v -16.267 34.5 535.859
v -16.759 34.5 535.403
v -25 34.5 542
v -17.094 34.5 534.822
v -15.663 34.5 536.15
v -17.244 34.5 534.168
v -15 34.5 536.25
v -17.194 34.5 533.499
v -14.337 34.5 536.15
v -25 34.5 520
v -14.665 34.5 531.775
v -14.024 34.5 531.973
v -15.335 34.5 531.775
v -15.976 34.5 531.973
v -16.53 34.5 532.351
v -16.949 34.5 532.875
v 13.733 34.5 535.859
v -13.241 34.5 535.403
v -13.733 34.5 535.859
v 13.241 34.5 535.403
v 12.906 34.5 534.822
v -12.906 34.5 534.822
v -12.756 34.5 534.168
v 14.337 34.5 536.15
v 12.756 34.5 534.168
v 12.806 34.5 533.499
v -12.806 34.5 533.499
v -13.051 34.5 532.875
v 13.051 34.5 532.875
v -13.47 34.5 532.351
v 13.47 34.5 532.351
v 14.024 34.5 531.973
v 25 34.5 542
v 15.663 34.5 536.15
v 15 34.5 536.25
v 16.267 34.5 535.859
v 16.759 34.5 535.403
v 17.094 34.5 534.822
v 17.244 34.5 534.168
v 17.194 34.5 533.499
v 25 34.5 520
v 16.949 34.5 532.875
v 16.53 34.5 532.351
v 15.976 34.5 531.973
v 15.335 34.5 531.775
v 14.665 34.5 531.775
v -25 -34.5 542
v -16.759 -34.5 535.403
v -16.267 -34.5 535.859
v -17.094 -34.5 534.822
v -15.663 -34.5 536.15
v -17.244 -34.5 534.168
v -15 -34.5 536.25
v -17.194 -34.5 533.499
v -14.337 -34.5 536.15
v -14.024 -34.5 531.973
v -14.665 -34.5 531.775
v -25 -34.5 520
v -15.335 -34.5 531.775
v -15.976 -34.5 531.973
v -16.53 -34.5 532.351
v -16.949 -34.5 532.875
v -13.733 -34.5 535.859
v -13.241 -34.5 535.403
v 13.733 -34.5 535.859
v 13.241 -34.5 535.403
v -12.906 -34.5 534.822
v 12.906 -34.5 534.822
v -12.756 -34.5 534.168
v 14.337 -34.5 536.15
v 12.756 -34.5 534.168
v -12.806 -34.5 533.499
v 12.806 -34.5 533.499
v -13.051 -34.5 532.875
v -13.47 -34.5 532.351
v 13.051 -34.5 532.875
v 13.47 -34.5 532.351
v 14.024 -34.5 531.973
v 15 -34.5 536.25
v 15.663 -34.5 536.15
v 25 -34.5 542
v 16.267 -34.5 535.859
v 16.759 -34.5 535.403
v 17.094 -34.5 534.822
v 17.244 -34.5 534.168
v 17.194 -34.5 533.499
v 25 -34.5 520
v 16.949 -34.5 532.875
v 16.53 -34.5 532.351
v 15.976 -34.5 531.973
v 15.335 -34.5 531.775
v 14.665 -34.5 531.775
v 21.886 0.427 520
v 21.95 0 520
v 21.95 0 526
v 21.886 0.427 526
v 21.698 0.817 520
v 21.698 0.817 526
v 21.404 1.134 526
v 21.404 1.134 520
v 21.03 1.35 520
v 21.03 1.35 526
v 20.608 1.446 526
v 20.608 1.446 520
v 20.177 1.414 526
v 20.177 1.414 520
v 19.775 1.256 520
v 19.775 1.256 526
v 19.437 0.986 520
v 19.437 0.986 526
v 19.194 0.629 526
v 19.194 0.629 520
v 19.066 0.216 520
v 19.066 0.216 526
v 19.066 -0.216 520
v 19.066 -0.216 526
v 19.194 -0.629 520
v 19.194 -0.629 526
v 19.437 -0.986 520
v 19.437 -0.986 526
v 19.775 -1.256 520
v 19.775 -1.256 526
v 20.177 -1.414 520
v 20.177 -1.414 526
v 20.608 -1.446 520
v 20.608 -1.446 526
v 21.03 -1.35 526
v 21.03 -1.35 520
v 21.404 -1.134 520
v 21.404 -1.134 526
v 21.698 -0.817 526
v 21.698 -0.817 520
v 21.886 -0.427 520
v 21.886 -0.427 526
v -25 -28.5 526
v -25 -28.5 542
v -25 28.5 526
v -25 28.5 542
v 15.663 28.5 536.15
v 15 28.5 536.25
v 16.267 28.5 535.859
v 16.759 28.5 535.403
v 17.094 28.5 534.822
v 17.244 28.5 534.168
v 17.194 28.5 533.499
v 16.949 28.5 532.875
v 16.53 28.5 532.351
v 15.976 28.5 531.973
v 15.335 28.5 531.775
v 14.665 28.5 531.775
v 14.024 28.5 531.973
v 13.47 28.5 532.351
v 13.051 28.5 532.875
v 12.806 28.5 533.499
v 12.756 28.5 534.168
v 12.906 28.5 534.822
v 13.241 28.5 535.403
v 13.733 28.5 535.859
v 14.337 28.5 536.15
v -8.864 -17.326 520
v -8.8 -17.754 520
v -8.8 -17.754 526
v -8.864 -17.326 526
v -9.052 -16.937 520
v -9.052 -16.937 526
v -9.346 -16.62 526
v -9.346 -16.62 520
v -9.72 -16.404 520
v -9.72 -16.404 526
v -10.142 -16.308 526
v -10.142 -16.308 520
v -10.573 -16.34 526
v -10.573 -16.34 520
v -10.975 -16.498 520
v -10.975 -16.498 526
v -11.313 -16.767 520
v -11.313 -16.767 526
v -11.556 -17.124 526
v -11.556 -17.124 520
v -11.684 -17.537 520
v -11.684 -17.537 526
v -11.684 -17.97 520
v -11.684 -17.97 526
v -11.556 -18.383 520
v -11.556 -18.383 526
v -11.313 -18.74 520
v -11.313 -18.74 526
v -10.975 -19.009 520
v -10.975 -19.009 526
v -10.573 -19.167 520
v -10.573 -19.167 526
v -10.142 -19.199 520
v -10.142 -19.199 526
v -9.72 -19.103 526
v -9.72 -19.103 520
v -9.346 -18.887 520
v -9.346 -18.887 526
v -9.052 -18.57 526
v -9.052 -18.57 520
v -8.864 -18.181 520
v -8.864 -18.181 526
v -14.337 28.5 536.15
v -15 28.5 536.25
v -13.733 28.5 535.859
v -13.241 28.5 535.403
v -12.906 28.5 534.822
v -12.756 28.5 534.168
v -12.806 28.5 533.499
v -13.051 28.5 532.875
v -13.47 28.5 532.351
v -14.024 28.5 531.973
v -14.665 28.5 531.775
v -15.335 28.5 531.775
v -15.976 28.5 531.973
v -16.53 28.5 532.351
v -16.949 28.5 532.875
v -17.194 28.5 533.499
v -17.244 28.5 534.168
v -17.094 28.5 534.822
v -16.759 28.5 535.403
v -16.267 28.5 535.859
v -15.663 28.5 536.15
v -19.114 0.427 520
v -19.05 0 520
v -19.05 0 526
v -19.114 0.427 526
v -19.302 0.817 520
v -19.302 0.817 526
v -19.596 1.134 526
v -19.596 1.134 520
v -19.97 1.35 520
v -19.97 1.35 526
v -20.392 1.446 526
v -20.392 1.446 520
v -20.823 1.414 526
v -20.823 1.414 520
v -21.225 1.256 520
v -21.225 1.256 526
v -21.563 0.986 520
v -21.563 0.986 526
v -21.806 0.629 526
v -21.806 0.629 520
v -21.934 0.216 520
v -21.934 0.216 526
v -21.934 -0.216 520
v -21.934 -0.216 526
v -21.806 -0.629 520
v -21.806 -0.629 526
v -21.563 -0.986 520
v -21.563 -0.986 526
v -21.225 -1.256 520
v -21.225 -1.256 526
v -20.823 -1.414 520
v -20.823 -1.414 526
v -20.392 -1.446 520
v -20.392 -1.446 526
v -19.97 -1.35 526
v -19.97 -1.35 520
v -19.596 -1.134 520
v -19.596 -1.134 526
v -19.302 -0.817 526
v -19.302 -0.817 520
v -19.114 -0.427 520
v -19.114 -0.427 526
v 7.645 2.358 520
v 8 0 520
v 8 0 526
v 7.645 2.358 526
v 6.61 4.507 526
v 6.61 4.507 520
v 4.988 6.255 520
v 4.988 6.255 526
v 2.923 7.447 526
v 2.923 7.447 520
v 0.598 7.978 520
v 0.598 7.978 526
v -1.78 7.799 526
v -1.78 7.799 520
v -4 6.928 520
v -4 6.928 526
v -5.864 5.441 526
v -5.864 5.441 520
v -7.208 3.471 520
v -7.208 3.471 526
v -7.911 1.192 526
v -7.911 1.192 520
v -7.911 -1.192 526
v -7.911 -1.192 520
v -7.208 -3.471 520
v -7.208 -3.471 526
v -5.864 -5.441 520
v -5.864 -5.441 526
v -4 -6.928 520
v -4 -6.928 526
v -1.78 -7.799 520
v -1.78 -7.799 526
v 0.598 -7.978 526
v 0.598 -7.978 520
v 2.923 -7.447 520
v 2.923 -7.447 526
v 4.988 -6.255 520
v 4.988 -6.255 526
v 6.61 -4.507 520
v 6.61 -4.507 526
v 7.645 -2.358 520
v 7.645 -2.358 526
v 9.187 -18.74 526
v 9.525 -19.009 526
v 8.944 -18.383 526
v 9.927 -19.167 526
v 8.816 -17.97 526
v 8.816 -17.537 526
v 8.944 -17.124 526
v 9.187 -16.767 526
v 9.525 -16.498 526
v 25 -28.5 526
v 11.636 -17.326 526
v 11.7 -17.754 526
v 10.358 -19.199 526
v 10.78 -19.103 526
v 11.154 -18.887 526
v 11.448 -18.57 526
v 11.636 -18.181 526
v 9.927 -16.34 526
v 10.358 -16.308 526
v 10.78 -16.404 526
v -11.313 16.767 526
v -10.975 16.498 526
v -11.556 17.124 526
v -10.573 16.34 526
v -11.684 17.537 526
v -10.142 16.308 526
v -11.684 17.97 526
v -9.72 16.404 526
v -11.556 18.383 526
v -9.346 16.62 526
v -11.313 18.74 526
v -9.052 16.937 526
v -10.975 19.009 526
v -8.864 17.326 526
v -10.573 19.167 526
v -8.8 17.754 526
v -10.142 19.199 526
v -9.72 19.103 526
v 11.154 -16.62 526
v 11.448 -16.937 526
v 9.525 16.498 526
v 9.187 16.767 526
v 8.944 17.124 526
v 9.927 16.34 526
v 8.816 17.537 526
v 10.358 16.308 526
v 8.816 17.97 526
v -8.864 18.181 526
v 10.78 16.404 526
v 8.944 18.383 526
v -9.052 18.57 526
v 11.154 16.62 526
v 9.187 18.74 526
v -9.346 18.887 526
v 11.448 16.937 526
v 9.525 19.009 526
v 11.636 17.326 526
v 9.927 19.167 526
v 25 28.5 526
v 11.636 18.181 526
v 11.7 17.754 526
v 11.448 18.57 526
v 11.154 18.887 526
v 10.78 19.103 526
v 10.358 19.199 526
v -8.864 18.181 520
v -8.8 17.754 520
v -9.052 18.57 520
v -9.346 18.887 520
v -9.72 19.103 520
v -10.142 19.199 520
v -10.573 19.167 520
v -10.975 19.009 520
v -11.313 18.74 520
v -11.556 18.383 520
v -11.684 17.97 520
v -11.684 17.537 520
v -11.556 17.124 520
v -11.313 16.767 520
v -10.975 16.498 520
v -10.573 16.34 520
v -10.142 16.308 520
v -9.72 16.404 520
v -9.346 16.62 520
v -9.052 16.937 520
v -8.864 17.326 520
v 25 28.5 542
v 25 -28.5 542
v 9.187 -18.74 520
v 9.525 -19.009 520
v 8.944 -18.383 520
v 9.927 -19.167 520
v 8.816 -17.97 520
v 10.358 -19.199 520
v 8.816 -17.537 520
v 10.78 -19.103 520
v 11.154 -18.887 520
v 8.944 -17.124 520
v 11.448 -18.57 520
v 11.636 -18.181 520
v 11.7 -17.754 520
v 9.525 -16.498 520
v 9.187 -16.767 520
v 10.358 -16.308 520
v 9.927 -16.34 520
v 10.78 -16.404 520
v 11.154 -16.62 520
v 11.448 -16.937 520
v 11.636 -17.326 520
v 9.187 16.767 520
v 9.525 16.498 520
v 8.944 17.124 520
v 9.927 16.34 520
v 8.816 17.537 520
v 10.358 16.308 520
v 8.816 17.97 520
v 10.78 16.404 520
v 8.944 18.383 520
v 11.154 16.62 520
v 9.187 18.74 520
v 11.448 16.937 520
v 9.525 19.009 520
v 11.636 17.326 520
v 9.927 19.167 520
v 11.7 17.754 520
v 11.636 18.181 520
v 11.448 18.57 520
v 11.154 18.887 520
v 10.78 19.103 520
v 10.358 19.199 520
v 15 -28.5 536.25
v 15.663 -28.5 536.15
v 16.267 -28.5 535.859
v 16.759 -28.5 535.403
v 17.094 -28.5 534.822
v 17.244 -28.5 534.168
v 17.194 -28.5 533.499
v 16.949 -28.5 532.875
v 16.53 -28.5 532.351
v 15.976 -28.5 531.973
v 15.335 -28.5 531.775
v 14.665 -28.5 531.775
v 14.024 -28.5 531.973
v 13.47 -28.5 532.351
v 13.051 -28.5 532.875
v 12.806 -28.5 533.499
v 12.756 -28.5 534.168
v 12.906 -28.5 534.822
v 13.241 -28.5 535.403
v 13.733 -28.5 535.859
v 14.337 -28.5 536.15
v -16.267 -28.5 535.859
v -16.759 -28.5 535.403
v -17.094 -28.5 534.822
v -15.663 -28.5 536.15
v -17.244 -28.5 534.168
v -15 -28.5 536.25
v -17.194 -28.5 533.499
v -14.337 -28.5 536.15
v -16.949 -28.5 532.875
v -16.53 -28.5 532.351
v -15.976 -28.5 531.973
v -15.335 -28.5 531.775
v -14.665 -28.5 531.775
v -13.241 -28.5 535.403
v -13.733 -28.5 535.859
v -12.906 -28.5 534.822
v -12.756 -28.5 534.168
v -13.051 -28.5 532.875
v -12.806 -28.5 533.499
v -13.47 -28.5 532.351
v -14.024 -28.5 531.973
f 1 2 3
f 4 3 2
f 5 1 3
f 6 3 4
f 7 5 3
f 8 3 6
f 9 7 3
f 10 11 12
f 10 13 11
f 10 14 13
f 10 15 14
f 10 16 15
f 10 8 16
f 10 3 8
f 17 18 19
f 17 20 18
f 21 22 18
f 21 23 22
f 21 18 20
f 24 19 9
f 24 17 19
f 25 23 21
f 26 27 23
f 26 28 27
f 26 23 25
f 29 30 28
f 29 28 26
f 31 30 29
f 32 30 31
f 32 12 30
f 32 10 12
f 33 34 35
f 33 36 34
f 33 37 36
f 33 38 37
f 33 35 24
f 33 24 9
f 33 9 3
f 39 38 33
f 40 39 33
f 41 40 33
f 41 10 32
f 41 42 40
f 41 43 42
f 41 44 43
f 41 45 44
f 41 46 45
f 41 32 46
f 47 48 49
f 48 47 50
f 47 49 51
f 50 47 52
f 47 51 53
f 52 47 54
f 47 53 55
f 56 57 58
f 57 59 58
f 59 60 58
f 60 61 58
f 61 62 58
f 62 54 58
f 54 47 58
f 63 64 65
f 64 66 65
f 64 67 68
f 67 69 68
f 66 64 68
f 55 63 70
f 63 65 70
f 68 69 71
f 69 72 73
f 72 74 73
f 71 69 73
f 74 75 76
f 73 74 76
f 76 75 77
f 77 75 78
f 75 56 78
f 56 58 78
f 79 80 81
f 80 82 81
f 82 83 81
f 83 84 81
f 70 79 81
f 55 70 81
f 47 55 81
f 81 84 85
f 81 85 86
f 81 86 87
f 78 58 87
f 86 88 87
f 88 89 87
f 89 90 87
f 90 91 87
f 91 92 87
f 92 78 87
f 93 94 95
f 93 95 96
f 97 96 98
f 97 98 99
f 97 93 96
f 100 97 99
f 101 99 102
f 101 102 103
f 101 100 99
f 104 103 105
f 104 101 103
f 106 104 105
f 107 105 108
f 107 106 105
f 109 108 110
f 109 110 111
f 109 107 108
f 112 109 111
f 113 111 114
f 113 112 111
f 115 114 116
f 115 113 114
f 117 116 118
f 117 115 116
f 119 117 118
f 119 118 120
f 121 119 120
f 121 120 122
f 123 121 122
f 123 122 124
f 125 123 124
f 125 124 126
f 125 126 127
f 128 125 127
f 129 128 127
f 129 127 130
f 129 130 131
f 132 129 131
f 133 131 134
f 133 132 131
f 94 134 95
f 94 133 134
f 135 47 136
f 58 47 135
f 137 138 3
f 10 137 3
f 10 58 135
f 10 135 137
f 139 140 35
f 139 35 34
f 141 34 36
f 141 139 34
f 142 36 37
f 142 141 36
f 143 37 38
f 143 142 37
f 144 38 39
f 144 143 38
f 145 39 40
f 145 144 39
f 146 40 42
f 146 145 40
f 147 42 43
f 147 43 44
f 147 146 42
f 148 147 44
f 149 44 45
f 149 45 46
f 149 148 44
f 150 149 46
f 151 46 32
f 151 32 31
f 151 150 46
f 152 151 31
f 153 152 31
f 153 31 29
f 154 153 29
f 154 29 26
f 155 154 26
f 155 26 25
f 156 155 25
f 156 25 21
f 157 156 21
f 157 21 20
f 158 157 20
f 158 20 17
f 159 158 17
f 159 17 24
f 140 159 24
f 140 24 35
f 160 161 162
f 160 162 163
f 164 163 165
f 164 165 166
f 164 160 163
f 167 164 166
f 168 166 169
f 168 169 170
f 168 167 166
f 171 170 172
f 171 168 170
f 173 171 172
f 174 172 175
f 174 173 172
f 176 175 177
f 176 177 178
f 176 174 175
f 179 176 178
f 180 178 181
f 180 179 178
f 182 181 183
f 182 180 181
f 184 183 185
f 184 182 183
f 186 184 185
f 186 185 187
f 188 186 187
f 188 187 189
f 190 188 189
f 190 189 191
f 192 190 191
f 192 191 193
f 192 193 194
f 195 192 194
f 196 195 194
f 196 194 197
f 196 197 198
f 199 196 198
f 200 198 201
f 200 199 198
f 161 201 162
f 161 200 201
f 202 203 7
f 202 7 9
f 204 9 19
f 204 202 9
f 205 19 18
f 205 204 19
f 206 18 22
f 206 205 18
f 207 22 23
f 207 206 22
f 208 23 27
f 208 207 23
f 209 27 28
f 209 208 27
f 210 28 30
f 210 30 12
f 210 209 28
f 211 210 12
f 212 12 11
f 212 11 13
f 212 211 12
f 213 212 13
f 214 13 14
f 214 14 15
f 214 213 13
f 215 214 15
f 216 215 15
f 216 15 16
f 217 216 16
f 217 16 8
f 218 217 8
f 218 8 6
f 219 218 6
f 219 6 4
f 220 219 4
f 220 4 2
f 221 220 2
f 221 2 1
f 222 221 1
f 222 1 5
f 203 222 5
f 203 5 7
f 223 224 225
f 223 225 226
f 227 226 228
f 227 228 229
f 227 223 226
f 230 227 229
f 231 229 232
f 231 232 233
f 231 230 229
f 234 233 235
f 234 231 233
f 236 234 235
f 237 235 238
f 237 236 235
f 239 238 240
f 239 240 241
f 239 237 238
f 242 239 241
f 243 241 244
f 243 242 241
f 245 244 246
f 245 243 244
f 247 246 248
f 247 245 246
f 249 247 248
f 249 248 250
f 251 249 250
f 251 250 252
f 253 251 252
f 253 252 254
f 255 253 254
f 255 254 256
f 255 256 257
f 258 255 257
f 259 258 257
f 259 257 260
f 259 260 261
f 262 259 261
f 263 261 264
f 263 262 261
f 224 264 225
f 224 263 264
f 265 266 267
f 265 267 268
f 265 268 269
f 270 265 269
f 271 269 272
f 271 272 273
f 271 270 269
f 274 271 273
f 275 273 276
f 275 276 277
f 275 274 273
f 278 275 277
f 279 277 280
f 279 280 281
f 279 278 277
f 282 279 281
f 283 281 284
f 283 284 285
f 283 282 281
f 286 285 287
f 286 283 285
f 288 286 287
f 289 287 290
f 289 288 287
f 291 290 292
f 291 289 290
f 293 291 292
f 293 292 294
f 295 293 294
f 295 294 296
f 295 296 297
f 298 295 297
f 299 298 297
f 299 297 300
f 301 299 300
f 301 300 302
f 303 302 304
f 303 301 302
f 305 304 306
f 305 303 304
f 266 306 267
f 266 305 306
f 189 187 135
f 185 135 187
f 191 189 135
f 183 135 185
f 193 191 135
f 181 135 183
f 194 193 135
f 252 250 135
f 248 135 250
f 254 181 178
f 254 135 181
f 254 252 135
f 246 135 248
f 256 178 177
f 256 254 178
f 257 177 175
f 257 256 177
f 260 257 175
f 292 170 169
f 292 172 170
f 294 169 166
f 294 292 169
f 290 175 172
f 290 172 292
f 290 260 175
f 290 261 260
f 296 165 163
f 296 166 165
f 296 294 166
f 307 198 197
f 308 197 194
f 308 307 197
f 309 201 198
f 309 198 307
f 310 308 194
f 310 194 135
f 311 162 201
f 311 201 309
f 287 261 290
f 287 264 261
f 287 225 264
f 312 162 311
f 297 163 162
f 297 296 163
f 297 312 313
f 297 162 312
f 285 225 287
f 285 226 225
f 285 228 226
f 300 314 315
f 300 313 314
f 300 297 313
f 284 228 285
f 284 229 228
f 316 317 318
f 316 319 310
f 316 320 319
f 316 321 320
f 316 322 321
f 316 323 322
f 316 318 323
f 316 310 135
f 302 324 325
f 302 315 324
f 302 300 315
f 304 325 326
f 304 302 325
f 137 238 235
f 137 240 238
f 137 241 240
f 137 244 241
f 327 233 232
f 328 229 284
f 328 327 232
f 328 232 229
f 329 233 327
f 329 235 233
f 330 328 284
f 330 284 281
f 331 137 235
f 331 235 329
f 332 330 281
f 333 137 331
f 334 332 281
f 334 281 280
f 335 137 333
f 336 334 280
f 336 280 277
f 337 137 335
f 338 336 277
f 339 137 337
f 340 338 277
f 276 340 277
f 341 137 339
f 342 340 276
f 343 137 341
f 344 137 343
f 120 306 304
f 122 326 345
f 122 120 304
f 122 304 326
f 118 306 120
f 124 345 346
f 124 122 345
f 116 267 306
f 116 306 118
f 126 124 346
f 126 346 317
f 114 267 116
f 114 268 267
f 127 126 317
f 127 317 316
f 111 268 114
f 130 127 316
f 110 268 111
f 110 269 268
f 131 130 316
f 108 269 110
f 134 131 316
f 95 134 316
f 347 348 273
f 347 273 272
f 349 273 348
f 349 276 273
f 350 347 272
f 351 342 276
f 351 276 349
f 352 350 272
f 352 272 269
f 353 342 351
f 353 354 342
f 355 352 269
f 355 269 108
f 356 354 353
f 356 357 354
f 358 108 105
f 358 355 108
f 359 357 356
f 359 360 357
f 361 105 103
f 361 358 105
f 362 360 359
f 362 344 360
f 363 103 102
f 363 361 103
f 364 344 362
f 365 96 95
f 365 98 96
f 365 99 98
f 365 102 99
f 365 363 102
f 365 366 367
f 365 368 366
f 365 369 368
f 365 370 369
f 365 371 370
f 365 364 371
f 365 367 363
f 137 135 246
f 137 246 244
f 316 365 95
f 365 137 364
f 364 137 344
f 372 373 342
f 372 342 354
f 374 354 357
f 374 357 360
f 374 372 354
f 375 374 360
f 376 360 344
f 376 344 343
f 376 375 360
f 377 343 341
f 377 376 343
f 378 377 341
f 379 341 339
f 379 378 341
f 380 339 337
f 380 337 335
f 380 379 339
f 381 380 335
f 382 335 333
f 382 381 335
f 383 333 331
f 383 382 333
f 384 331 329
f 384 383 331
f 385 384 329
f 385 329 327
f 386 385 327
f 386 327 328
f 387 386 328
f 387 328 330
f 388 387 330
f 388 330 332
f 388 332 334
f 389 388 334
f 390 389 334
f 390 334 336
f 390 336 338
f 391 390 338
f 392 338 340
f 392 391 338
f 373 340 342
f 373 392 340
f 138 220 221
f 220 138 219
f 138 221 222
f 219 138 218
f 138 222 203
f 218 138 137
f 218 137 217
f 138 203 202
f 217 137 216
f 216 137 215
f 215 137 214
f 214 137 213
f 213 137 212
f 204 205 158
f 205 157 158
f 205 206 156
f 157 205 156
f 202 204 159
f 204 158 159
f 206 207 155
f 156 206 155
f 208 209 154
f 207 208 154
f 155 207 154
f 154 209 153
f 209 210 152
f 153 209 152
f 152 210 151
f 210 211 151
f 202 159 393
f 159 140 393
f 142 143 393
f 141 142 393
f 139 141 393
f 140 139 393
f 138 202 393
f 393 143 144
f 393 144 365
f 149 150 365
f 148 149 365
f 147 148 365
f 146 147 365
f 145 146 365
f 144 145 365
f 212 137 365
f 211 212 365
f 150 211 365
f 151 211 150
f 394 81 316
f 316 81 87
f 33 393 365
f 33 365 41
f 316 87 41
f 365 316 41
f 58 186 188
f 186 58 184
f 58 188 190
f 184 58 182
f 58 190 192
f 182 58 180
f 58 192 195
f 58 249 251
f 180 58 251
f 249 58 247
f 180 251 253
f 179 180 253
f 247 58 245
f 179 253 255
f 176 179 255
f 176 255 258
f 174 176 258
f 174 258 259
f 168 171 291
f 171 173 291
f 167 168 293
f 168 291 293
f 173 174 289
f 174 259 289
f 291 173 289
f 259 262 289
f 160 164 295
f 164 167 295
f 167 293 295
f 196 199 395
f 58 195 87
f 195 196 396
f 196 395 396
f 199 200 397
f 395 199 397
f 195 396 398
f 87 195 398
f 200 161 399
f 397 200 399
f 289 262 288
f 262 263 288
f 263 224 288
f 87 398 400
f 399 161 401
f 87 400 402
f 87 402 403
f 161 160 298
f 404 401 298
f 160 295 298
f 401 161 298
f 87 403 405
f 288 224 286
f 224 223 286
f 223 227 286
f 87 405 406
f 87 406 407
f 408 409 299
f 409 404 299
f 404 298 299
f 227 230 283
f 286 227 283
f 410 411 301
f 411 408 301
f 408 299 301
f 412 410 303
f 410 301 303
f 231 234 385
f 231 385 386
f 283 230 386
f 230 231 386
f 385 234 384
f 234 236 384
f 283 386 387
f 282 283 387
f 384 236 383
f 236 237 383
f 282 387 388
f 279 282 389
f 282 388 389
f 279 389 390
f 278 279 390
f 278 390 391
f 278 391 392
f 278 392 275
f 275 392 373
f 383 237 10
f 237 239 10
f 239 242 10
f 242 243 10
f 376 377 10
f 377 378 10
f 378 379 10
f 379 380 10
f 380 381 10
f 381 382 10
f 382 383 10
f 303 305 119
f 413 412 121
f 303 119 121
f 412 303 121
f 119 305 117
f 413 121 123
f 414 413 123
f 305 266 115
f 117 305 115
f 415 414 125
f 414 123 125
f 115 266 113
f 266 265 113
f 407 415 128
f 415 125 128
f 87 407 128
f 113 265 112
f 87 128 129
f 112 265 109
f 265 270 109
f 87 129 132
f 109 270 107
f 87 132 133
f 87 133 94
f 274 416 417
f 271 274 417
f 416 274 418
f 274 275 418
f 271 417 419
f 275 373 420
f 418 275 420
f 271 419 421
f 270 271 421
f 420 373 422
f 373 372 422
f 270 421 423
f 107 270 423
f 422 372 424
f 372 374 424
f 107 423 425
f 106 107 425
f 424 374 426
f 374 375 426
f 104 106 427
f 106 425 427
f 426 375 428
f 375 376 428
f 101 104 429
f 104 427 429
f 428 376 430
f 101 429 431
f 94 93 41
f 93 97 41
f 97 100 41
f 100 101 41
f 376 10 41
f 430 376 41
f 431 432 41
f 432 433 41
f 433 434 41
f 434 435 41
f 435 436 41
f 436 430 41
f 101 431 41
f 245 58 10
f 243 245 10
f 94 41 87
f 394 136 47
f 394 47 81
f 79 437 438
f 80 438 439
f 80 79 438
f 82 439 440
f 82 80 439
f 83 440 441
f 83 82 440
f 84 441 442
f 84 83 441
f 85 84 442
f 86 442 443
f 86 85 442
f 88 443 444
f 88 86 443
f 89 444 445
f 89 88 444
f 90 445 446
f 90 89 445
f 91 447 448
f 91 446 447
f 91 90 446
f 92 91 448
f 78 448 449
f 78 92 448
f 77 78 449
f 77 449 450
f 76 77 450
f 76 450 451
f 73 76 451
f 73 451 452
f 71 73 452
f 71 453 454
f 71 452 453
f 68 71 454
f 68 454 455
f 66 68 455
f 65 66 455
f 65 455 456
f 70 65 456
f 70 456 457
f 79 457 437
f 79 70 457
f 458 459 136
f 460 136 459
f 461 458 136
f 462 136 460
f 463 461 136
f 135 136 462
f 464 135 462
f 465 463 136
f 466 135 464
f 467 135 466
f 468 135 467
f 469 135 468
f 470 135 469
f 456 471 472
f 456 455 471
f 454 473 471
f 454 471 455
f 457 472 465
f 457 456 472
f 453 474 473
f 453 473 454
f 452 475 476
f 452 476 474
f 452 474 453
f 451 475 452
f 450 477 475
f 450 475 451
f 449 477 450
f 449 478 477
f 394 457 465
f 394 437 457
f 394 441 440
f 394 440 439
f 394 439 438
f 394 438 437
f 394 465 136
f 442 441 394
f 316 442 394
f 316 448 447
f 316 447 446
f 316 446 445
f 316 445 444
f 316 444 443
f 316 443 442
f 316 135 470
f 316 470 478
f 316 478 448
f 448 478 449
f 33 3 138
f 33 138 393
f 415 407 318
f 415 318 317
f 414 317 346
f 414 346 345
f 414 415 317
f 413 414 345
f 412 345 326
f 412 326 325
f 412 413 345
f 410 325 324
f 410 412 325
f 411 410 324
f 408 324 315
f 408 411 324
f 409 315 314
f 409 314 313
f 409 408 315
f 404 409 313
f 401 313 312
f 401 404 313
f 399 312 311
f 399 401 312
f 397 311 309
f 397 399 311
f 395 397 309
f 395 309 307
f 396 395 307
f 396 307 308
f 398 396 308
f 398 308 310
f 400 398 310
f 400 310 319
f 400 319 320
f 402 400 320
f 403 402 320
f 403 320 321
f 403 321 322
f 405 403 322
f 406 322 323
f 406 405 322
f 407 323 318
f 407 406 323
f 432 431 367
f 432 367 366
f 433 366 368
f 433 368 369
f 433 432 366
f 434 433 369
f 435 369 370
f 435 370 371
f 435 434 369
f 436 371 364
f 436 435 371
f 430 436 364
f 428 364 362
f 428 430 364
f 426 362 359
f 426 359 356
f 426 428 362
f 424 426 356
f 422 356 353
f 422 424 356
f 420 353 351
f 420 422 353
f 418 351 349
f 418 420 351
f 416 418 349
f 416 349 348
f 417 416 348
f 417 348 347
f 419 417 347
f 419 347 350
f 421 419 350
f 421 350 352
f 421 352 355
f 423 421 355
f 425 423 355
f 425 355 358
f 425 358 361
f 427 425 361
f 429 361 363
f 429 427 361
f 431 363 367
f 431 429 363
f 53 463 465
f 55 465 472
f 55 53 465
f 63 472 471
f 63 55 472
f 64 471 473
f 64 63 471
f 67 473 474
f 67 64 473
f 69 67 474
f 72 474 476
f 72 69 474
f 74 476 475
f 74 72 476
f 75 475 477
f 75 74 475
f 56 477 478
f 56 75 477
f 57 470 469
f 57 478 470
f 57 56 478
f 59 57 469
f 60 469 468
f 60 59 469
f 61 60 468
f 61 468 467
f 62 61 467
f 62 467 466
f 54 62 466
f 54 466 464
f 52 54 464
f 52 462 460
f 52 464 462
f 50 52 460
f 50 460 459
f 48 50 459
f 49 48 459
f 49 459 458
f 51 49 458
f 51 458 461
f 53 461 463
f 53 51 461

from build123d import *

# Parameters (mm, degrees)
REPISA_START                   = 520
SK_REPISA_W                    = 50
SK_REPISA_H                    = 69
REPISA_DEPTH                   = 6
CENTRO_MOTOR_START             = 520
SK_CENTRO_MOTOR_R              = 8
CENTRO_MOTOR_DEPTH             = 6
PASANTES_M2_5_ESTATOR_J6_START = 520
SK_PASANTES_M2_5_ESTATOR_J6_R  = 1.45
PASANTES_M2_5_ESTATOR_J6_DEPTH = 6
PESTANAS_START                 = 526
SK_PESTANAS_W                  = 50
SK_PESTANAS_H                  = 6
PESTANAS_DEPTH                 = 16
PASANTES_M4_PESTANAS_START     = -34.5
SK_PASANTES_M4_PESTANAS_R      = 2.25
PASANTES_M4_PESTANAS_DEPTH     = 69


with BuildPart() as part:
    # Sk_Repisa → Repisa (new body)
    with BuildSketch(Plane.XY.offset(REPISA_START)):
        Rectangle(SK_REPISA_W, SK_REPISA_H)
    extrude(amount=REPISA_DEPTH)

    # Sk_Centro_motor → Centro_motor (cut)
    with BuildSketch(Plane.XY.offset(CENTRO_MOTOR_START)):
        Circle(SK_CENTRO_MOTOR_R)
    extrude(amount=CENTRO_MOTOR_DEPTH, mode=Mode.SUBTRACT)

    # Sk_Pasantes_M2-5_estator_J6 → Pasantes_M2-5_estator_J6 (cut)
    with BuildSketch(Plane.XY.offset(PASANTES_M2_5_ESTATOR_J6_START)):
        with Locations((20.5, 0)):
            Circle(SK_PASANTES_M2_5_ESTATOR_J6_R)
        with Locations((10.25, 17.753520778)):
            Circle(SK_PASANTES_M2_5_ESTATOR_J6_R)
        with Locations((-10.25, 17.753520778)):
            Circle(SK_PASANTES_M2_5_ESTATOR_J6_R)
        with Locations((-20.5, 0)):
            Circle(SK_PASANTES_M2_5_ESTATOR_J6_R)
        with Locations((-10.25, -17.753520778)):
            Circle(SK_PASANTES_M2_5_ESTATOR_J6_R)
        with Locations((10.25, -17.753520778)):
            Circle(SK_PASANTES_M2_5_ESTATOR_J6_R)
    extrude(amount=PASANTES_M2_5_ESTATOR_J6_DEPTH, mode=Mode.SUBTRACT)

    # Sk_Pestanas → Pestanas (add)
    with BuildSketch(Plane.XY.offset(PESTANAS_START)):
        with Locations((0, 31.5)):
            Rectangle(SK_PESTANAS_W, SK_PESTANAS_H)
        with Locations((0, -31.5)):
            Rectangle(SK_PESTANAS_W, SK_PESTANAS_H)
    extrude(amount=PESTANAS_DEPTH)

    # Sk_Pasantes_M4_pestanas → Pasantes_M4_pestanas (cut)
    with BuildSketch(Plane(origin=(0, 0, 0), x_dir=(1, 0, 0), z_dir=(0, 1, 0)).offset(PASANTES_M4_PESTANAS_START)):
        with Locations(Location((-15, -534, 0), (0, 0, 270))):
            Circle(SK_PASANTES_M4_PESTANAS_R)
        with Locations(Location((15, -534, 0), (0, 0, 270))):
            Circle(SK_PASANTES_M4_PESTANAS_R)
    extrude(amount=PASANTES_M4_PESTANAS_DEPTH, mode=Mode.SUBTRACT)


solid = part.part
